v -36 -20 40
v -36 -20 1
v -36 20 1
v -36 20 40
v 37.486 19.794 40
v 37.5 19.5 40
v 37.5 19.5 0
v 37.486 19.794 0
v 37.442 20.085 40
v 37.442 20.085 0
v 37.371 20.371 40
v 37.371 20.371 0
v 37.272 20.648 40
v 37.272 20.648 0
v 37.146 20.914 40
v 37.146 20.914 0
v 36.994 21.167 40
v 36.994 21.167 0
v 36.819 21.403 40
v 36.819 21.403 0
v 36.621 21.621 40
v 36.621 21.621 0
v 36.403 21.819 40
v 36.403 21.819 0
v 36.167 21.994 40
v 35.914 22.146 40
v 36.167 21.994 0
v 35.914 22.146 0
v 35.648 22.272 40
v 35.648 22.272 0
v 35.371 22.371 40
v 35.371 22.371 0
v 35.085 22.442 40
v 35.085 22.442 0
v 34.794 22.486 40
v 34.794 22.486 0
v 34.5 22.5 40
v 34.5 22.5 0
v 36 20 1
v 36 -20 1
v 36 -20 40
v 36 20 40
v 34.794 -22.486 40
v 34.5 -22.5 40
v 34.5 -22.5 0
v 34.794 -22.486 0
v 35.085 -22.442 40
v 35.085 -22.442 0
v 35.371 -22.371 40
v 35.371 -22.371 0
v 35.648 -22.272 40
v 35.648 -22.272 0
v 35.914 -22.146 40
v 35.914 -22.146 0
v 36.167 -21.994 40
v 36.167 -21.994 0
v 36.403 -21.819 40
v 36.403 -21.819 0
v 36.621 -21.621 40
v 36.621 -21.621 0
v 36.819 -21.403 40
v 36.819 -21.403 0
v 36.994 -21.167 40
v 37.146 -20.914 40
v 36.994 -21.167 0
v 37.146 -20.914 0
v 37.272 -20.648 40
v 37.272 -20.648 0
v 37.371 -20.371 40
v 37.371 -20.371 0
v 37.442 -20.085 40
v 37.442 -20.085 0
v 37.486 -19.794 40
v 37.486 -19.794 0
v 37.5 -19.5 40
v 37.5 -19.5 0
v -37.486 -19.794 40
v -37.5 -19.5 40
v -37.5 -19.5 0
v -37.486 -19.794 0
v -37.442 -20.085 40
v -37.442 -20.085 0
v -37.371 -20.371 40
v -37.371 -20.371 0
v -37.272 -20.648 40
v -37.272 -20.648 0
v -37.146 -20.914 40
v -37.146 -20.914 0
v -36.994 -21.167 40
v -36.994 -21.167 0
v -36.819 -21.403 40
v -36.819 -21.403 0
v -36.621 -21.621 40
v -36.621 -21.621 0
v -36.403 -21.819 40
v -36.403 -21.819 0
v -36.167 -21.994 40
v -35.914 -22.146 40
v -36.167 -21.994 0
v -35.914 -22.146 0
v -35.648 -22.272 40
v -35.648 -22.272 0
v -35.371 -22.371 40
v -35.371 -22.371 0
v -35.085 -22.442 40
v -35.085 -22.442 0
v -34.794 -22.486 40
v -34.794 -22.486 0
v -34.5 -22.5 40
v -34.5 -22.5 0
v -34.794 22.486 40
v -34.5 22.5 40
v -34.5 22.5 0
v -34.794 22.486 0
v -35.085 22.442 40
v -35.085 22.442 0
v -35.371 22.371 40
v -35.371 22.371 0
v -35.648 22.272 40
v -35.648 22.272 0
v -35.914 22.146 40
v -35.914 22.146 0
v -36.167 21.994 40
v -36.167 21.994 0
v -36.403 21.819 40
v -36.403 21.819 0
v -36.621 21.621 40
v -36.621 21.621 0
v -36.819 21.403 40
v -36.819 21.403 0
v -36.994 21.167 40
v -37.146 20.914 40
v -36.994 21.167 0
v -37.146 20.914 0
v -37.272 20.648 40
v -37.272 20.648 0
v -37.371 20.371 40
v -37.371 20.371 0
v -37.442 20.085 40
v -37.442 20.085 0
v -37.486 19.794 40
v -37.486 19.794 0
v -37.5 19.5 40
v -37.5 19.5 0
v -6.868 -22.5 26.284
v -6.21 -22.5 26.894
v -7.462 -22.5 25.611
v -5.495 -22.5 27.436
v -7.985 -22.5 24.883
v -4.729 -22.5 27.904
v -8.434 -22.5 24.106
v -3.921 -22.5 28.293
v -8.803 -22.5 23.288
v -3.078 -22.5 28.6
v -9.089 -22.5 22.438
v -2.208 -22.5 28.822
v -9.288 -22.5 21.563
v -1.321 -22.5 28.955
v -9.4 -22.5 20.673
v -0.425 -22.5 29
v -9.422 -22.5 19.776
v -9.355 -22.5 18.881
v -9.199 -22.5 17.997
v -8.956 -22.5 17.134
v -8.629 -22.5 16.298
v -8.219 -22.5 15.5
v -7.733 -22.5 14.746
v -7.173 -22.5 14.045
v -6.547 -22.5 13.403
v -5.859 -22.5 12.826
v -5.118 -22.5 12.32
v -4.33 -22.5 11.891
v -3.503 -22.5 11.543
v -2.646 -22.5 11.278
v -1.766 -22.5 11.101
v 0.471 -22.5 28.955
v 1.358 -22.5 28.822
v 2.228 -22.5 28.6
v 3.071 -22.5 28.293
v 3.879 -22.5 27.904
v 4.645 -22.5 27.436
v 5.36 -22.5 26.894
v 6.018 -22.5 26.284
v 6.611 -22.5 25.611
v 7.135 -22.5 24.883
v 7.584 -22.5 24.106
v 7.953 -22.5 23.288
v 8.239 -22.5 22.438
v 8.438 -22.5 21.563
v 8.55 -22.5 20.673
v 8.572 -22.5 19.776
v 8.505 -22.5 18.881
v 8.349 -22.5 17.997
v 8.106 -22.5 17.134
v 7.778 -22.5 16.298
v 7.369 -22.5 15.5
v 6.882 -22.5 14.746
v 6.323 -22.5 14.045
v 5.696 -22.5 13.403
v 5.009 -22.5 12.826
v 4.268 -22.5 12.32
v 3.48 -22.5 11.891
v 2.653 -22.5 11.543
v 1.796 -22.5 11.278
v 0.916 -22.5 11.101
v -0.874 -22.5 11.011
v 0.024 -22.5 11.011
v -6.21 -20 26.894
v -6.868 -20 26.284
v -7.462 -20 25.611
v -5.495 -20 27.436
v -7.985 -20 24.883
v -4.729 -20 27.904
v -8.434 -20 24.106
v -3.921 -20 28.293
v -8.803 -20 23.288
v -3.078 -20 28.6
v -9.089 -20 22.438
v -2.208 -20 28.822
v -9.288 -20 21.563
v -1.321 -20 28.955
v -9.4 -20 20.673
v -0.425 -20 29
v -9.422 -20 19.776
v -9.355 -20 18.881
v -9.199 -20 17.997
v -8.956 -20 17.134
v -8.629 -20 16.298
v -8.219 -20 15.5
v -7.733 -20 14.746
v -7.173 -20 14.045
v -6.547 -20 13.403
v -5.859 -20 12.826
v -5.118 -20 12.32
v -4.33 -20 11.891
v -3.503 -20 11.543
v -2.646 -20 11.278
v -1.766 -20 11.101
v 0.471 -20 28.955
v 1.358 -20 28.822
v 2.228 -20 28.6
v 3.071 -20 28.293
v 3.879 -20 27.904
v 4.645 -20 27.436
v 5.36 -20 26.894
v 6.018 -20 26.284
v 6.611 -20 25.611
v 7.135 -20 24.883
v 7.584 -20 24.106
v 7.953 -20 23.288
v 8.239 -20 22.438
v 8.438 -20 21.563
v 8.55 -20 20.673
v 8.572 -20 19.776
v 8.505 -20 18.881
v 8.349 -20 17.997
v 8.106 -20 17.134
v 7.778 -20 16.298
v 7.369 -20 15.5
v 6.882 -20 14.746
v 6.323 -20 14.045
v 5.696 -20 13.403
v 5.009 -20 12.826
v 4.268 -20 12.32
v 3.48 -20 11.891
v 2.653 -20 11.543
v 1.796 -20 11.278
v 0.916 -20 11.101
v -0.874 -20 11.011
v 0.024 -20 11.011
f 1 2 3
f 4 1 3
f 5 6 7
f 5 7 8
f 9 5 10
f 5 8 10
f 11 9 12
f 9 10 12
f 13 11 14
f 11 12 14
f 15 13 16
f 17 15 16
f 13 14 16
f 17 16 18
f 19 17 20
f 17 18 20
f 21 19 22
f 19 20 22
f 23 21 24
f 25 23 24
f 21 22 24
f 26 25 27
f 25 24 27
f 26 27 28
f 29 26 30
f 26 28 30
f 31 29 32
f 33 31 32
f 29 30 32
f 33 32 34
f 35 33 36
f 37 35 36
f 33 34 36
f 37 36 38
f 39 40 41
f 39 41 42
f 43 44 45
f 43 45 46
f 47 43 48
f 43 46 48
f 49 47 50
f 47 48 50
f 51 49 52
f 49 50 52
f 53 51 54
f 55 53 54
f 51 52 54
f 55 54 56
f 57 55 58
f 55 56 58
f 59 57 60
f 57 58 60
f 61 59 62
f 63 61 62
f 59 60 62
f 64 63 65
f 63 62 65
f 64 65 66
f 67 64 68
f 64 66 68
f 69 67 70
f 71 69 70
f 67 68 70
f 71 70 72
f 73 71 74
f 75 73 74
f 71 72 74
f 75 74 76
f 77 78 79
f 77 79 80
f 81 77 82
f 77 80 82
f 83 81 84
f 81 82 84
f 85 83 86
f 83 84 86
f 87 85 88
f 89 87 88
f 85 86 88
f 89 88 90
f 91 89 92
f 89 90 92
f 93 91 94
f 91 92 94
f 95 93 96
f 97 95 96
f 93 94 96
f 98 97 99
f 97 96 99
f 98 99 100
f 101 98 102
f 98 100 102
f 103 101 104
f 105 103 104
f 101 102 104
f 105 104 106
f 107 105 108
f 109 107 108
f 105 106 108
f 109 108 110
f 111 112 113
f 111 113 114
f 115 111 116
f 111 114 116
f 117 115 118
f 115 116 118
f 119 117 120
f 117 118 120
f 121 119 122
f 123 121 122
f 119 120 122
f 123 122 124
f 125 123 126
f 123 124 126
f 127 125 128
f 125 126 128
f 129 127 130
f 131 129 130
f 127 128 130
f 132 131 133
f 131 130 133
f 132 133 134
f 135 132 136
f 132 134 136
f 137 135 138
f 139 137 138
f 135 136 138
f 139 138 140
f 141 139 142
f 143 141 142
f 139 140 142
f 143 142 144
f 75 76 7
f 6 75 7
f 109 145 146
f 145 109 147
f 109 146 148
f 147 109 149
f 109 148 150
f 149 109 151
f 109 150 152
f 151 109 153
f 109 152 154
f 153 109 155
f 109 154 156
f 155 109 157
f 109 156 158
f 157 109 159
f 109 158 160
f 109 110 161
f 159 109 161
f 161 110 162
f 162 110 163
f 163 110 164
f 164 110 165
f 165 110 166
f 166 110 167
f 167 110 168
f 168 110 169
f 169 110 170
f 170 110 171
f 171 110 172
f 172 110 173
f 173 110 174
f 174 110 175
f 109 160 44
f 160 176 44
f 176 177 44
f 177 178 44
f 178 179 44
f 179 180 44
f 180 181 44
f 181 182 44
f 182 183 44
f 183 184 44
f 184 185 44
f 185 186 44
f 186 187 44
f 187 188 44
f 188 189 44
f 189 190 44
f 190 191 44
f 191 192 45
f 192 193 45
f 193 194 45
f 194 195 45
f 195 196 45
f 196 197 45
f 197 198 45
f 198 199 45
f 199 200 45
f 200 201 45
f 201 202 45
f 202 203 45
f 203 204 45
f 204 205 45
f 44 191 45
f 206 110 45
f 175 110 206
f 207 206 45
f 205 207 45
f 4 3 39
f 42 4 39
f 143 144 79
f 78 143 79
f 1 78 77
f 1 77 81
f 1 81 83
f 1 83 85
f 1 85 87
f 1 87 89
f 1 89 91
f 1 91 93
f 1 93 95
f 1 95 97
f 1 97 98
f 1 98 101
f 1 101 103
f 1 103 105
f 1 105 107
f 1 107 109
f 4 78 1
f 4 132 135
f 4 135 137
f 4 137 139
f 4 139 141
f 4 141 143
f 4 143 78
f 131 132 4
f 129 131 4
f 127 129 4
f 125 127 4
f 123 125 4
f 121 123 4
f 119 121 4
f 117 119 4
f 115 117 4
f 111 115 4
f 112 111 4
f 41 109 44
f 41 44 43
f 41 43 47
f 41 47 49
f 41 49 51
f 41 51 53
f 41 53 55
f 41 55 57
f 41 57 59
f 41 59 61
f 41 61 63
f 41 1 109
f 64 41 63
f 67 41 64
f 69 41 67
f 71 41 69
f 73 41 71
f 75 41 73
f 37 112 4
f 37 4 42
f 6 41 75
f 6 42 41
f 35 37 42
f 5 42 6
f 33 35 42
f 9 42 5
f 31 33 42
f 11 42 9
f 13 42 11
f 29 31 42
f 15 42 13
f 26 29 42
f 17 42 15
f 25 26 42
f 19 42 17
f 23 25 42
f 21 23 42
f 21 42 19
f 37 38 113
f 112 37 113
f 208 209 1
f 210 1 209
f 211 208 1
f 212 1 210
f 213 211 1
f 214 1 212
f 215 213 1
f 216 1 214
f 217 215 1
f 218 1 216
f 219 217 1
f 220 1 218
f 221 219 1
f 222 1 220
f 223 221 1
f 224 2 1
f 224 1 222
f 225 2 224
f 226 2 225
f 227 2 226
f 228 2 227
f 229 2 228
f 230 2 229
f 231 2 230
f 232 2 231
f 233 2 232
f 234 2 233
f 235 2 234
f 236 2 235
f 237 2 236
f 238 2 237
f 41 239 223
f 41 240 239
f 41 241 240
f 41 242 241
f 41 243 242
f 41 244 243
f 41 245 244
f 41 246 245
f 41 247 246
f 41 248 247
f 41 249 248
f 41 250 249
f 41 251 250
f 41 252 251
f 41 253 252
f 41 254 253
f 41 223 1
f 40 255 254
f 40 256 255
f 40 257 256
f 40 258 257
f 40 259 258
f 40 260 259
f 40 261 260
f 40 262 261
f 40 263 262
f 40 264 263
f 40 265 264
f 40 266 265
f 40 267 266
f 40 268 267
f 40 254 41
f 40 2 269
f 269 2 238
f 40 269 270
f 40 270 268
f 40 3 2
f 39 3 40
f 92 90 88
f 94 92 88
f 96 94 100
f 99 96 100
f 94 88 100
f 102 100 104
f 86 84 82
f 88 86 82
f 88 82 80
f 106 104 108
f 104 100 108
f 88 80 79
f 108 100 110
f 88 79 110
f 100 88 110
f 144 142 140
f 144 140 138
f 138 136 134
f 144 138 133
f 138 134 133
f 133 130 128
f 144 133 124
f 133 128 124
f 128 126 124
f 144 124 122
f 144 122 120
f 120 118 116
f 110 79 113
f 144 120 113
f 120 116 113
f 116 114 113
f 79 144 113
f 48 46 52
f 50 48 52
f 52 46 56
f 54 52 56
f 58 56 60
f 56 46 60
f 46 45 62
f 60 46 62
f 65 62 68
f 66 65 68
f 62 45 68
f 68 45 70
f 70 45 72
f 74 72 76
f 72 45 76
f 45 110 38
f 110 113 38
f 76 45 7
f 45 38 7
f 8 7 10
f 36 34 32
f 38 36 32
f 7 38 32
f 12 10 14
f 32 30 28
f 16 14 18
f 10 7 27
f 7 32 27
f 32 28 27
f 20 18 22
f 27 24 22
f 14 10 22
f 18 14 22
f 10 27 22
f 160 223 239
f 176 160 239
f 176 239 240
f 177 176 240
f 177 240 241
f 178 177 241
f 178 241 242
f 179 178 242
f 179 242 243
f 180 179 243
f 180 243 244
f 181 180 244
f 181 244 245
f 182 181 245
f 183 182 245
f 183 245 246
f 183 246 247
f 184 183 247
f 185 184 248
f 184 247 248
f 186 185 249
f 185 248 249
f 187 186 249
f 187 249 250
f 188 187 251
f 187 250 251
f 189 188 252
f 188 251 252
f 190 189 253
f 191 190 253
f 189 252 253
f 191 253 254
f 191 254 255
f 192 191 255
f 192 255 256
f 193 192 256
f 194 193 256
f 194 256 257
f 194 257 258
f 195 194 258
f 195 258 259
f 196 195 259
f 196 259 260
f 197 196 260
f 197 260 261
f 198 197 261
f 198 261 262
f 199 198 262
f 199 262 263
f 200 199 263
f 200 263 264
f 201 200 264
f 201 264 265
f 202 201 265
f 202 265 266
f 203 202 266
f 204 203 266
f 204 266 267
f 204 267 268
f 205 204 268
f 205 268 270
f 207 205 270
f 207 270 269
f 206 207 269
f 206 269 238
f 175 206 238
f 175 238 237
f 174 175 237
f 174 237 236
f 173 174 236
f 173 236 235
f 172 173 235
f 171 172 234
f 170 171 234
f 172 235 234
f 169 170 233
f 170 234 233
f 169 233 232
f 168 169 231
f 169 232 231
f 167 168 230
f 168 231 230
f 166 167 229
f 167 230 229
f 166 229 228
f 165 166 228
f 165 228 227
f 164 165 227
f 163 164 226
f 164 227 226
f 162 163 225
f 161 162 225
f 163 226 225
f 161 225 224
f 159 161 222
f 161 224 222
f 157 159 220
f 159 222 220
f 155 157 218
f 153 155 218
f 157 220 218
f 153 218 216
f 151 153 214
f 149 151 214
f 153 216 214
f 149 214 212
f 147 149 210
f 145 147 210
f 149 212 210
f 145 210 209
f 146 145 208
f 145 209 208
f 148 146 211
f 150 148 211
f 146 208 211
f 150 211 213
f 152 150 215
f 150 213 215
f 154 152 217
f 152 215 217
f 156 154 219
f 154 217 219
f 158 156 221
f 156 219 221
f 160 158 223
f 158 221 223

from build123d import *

# Parameters (mm, degrees)
SKETCH1_W           = 72
SKETCH1_H           = 40
BOSS_EXTRUDE2_DEPTH = 40
SKETCH3_R           = 9
CUT_EXTRUDE2_DEPTH  = 4
SKETCH7_W           = 72
SKETCH7_H           = 40
BOSS_EXTRUDE5_DEPTH = 1


with BuildPart() as part:
    # Sketch1 → Boss-Extrude2 (new body)
    with BuildSketch(Plane.XY):
        with BuildLine():
            Line((-34.5, -22.5), (34.5, -22.5))
            ThreePointArc((34.5, -22.5), (36.621320344, -21.621320344), (37.5, -19.5))
            Line((37.5, -19.5), (37.5, 19.5))
            ThreePointArc((37.5, 19.5), (36.621320344, 21.621320344), (34.5, 22.5))
            Line((34.5, 22.5), (-34.5, 22.5))
            ThreePointArc((-34.5, 22.5), (-36.621320344, 21.621320344), (-37.5, 19.5))
            Line((-37.5, 19.5), (-37.5, -19.5))
            ThreePointArc((-37.5, -19.5), (-36.621320344, -21.621320344), (-34.5, -22.5))
        make_face()
        Rectangle(SKETCH1_W, SKETCH1_H, mode=Mode.SUBTRACT)
    extrude(amount=BOSS_EXTRUDE2_DEPTH)

    # Sketch3 → Cut-Extrude2 (cut)
    with BuildSketch(Plane(origin=(0, -20, 0), x_dir=(1, 0, 0), z_dir=(0, 1, 0))):
        with Locations(Location((-0.42510875, -20, 0), (0, 0, 270))):
            Circle(SKETCH3_R)
    extrude(amount=-CUT_EXTRUDE2_DEPTH, mode=Mode.SUBTRACT)

    # Sketch7 → Boss-Extrude5 (add)
    with BuildSketch(Plane.XY):
        Rectangle(SKETCH7_W, SKETCH7_H)
    extrude(amount=BOSS_EXTRUDE5_DEPTH)


solid = part.part
